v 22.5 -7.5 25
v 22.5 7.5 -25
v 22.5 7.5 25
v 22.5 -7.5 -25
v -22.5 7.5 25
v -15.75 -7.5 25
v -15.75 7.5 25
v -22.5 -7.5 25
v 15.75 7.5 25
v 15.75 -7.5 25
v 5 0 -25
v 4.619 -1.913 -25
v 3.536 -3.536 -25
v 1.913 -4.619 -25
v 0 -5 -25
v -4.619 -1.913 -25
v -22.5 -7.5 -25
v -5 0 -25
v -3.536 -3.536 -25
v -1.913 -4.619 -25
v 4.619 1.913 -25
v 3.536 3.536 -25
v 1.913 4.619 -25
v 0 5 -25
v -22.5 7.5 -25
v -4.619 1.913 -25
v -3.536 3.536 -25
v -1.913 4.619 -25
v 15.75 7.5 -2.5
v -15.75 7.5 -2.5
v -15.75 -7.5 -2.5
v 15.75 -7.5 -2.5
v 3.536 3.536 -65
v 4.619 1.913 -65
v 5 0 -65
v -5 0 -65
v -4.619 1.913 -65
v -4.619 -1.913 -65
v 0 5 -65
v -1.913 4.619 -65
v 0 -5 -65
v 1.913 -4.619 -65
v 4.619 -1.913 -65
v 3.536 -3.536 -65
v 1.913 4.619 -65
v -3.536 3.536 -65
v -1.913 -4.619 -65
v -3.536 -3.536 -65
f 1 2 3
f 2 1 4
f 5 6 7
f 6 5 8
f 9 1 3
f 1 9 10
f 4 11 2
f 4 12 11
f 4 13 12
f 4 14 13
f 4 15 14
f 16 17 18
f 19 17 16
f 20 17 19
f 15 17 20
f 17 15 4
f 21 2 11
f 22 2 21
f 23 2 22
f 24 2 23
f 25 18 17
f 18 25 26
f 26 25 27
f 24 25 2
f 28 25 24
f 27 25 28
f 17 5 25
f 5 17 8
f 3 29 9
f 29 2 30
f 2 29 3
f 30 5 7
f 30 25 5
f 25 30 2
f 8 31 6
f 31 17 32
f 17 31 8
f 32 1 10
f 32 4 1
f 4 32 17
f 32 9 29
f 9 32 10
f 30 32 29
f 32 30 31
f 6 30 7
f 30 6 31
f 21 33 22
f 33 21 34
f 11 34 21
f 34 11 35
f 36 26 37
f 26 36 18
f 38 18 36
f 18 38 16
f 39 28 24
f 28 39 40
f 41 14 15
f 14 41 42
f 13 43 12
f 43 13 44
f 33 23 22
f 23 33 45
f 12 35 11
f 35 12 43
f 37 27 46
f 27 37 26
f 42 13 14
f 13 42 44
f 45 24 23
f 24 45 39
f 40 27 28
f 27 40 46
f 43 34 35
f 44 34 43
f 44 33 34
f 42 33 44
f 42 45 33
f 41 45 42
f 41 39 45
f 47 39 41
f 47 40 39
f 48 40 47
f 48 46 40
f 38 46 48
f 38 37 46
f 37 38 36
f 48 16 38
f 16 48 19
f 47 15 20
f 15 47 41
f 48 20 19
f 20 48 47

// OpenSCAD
// Beam C-clamp — attaches threaded rod to a steel beam flange.
body_h = 50;
body_w = 45;
body_t = 15;
jaw_d = 30;
rod_d = 10;
rod_l = 40;
union() {
    difference() {
        cube(size = [body_w, body_t, body_h], center = true);
        translate([0, 0, body_h / 4])
            cube(size = [body_w * 0.7, body_t + 0.2, jaw_d], center = true);
    }
    // Threaded rod down
    translate([0, 0, -body_h / 2 - rod_l / 2])
        cylinder(h = rod_l, d = rod_d, center = true, $fn = 16);
}
